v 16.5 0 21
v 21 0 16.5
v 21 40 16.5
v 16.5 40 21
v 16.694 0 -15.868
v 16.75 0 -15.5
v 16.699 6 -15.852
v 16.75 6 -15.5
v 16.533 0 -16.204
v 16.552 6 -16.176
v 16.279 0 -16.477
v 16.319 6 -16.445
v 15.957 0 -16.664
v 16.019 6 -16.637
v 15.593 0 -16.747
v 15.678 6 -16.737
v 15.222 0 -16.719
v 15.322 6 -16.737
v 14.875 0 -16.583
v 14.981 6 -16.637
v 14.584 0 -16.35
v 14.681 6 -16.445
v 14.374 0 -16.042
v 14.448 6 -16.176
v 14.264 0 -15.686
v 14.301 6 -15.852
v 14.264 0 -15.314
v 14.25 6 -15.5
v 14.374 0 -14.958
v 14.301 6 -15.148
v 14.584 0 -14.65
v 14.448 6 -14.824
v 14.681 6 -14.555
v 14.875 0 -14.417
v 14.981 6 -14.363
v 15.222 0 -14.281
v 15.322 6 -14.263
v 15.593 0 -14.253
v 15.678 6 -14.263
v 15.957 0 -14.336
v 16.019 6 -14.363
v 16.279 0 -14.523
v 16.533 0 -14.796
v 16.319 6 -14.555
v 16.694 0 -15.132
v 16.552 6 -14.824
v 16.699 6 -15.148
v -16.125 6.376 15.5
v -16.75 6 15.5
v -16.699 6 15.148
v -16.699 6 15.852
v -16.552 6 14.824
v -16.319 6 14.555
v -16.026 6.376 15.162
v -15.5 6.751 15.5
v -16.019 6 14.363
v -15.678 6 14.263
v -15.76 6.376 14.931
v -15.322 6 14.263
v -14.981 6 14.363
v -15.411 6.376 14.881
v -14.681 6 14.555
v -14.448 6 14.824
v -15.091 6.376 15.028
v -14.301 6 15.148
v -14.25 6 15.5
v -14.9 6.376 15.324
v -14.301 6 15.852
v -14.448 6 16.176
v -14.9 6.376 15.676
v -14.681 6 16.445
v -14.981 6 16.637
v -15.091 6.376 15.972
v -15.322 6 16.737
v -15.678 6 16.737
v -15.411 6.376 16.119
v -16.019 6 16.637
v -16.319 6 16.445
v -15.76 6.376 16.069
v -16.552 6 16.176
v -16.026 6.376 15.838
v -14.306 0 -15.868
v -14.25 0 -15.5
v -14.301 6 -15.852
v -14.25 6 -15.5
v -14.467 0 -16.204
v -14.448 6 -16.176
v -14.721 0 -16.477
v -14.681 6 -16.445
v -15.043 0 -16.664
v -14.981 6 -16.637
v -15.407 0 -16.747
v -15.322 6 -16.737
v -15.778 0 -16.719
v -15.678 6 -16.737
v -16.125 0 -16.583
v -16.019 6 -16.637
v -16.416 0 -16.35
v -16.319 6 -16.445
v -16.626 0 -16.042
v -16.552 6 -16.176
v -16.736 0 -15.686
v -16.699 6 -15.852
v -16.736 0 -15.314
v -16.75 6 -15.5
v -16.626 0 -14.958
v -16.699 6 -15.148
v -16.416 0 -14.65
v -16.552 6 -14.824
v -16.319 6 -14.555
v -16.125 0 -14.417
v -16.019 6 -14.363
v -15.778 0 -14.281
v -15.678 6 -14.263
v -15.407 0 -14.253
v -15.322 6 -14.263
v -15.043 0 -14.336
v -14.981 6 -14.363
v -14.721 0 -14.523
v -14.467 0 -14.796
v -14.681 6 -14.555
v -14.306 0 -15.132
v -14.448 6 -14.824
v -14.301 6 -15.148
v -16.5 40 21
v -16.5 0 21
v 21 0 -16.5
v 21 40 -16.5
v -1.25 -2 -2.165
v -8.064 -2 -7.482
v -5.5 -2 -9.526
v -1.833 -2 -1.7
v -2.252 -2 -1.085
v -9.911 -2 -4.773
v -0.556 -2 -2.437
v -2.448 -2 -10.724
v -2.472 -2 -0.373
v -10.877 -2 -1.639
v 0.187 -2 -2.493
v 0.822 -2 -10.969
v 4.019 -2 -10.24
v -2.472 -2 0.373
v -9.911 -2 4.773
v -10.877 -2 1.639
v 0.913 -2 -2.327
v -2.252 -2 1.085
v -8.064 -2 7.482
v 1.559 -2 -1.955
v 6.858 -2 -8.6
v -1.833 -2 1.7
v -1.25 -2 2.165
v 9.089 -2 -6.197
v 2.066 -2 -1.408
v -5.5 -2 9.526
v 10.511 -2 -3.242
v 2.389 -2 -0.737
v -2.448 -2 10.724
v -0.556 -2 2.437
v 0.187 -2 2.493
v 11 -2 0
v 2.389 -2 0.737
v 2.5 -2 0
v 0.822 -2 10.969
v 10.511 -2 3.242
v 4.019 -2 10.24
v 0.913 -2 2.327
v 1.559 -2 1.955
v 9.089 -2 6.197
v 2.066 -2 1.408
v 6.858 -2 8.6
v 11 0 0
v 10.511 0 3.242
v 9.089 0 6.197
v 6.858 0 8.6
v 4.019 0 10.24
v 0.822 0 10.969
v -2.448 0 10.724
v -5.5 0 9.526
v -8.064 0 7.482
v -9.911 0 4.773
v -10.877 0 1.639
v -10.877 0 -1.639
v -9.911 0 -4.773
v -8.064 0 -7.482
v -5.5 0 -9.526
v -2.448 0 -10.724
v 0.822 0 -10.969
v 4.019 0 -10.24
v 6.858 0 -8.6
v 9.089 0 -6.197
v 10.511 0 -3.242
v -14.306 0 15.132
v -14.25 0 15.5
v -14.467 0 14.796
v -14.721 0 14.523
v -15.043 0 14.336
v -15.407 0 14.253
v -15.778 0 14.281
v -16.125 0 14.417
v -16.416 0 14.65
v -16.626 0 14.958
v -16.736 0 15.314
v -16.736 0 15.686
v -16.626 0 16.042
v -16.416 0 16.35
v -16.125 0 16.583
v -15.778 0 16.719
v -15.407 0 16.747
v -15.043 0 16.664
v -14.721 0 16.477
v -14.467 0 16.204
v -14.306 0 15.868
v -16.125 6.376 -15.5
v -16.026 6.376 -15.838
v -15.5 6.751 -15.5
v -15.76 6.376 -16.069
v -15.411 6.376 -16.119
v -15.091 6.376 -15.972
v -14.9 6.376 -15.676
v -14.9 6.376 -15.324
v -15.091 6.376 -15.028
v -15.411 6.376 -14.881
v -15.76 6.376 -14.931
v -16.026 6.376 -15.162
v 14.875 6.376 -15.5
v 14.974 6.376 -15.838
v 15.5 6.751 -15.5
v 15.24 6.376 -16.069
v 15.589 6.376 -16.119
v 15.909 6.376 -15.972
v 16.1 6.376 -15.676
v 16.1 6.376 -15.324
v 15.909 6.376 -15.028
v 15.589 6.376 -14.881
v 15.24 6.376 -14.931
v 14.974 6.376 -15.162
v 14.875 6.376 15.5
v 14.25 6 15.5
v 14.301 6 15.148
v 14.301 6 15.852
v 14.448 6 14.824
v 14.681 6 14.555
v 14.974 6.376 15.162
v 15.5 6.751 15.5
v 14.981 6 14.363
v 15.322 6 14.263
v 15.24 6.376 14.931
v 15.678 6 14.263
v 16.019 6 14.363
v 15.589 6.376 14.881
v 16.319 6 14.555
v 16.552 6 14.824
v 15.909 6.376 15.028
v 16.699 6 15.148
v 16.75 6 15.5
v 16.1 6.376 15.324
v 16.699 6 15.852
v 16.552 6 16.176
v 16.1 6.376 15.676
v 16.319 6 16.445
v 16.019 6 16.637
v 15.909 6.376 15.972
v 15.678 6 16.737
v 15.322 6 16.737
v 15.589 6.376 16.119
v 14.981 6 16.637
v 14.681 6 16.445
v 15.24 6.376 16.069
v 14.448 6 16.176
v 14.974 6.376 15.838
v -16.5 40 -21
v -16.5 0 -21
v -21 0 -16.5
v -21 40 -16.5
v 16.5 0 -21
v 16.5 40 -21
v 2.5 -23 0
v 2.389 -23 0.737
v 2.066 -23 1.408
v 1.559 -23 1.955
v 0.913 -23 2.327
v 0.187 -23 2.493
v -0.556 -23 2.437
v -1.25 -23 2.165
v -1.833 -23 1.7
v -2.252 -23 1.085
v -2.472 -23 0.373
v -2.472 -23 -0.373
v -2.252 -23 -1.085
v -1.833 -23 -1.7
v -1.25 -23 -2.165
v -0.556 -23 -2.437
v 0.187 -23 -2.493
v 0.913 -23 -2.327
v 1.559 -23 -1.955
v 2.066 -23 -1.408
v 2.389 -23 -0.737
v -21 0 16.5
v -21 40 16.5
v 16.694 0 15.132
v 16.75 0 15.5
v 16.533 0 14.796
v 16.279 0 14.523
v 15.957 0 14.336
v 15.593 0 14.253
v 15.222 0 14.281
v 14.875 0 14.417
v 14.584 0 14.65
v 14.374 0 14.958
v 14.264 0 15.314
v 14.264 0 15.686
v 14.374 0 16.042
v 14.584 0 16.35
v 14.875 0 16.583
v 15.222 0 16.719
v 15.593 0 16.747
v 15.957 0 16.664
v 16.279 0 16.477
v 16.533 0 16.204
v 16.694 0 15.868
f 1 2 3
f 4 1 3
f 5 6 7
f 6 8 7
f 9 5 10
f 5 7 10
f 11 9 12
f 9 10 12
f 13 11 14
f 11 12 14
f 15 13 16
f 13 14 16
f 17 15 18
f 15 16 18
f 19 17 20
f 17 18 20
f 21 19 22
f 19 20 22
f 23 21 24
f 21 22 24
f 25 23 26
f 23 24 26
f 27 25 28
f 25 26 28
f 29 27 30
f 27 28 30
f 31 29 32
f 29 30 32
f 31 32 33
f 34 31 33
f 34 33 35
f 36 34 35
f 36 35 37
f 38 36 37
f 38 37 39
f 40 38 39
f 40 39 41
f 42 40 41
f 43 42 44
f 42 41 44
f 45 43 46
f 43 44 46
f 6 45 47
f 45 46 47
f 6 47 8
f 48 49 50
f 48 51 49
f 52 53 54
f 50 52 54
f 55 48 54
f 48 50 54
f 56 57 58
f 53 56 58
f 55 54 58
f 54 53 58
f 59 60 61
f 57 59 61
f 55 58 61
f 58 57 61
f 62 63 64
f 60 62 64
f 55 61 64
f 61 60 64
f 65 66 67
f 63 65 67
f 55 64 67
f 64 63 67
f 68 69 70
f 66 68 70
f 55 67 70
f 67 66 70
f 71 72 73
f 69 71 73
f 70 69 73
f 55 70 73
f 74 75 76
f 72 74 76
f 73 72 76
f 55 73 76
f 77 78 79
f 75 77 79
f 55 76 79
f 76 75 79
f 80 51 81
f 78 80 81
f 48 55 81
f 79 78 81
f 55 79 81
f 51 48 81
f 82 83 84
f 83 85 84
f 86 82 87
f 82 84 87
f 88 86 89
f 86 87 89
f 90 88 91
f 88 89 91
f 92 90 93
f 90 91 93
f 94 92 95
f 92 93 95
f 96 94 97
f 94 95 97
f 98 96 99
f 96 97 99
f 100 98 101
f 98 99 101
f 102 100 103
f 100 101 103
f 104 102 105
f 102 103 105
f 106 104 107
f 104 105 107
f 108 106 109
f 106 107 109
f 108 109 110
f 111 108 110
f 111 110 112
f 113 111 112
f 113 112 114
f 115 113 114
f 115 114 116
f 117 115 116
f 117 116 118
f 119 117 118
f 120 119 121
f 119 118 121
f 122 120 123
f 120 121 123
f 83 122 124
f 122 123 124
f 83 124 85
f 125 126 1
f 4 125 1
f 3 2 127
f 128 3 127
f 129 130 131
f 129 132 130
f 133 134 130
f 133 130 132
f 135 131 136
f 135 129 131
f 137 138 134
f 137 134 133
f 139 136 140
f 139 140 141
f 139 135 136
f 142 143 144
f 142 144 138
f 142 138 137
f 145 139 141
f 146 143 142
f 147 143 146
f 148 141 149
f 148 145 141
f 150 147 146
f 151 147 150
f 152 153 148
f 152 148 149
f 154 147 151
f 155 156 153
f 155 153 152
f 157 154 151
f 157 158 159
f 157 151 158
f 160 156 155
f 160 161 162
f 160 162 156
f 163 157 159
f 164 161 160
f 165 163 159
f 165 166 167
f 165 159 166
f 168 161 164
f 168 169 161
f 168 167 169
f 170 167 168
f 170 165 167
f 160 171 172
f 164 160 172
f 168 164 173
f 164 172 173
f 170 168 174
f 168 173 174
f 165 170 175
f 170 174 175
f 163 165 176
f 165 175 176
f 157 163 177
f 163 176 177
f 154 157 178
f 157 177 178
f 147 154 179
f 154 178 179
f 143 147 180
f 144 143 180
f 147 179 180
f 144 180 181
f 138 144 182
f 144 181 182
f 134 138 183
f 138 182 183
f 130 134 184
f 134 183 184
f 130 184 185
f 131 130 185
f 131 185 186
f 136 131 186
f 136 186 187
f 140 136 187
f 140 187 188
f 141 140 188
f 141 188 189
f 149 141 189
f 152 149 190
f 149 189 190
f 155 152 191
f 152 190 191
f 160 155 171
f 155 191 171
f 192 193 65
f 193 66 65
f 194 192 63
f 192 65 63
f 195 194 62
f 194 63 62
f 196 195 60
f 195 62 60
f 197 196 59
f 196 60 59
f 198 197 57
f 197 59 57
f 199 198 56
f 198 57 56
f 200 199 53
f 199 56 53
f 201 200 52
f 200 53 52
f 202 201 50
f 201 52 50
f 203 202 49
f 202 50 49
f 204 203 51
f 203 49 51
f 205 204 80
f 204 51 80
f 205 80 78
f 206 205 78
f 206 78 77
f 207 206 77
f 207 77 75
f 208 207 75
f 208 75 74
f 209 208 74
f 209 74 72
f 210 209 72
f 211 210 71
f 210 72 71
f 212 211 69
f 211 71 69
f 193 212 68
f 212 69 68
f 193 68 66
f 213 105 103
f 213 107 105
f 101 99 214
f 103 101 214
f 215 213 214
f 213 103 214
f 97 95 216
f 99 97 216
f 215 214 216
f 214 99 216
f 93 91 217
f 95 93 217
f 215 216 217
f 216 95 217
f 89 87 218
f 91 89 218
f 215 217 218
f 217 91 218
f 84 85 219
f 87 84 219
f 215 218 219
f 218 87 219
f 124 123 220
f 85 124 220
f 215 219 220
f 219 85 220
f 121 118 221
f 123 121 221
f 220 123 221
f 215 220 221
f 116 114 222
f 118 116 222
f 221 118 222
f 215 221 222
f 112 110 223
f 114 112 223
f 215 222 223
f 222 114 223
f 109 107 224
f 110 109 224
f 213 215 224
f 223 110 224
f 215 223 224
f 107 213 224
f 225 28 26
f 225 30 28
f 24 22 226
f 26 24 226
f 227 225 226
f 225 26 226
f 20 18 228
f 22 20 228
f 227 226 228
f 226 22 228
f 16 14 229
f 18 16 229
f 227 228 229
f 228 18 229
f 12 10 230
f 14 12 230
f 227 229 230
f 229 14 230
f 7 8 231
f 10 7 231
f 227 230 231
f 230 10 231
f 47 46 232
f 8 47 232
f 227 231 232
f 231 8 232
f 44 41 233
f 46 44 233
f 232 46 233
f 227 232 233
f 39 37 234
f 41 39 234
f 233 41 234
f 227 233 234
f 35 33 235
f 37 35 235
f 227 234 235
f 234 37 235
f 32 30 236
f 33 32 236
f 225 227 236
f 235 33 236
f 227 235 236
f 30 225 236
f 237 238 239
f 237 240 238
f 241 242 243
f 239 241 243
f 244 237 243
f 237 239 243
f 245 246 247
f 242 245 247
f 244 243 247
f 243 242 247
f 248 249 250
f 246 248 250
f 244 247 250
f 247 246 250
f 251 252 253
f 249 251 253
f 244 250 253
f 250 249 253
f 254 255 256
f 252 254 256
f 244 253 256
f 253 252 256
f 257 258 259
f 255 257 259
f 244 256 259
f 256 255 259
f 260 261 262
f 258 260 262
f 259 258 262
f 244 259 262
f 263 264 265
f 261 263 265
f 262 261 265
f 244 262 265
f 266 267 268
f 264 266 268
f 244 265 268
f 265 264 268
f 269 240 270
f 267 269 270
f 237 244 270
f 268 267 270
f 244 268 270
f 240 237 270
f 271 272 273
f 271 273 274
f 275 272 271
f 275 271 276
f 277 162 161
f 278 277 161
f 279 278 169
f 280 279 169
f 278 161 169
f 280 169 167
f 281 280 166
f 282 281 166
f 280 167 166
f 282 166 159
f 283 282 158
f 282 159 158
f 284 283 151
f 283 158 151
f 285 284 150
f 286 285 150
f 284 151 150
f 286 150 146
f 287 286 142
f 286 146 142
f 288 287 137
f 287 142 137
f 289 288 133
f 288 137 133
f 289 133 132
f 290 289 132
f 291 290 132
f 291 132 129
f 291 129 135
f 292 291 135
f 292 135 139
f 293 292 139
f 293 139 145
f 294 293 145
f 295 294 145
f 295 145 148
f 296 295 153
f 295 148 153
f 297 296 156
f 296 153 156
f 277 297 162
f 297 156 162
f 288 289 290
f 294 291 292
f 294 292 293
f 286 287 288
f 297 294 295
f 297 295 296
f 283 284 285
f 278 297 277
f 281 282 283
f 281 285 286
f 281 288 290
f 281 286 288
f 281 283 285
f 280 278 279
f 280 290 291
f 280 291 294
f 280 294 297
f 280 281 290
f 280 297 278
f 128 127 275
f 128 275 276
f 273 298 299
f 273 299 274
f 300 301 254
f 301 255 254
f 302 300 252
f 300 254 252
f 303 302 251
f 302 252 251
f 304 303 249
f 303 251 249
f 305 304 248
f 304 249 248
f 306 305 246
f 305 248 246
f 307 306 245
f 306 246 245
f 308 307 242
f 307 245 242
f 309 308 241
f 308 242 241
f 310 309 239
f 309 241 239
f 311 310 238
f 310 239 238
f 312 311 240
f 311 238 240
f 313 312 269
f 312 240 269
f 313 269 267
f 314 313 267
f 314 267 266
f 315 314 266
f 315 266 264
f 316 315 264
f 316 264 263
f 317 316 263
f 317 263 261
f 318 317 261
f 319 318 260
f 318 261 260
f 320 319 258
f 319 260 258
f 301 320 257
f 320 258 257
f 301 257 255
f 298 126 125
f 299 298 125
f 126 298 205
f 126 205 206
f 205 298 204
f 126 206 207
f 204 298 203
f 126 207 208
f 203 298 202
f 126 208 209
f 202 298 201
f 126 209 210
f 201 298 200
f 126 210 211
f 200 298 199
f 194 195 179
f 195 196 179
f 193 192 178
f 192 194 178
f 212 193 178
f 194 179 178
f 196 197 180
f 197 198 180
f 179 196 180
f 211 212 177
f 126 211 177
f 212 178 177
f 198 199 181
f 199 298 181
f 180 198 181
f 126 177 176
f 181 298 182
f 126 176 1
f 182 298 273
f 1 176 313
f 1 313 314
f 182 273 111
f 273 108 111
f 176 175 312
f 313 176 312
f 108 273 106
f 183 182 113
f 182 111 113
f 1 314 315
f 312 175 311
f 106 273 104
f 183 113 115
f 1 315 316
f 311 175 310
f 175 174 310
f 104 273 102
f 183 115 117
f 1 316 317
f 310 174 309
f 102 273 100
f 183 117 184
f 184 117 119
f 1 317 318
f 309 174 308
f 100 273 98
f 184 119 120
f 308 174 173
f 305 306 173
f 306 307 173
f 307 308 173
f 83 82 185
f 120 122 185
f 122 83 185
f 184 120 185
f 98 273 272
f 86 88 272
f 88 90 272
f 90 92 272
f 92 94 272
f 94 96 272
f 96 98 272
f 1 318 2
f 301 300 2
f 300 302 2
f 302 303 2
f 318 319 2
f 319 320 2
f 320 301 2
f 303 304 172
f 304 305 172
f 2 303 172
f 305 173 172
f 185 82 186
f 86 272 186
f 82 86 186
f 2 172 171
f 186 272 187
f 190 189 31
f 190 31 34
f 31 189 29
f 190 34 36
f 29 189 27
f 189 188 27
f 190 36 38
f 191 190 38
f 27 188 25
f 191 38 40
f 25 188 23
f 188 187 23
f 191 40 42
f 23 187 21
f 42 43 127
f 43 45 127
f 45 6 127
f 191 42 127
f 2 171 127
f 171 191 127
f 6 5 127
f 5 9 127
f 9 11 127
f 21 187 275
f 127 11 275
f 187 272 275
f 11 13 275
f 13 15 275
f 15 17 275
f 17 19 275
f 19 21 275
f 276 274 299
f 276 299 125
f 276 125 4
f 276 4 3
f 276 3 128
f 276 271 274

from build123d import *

# Parameters (mm, degrees)
SKETCH1_W                 = 42
SKETCH1_H                 = 42
BOSS_EXTRUDE1_DEPTH       = 40
SKETCH2_R                 = 11
BOSS_EXTRUDE2_DEPTH       = 2
SKETCH3_R                 = 2.5
BOSS_EXTRUDE3_DEPTH       = 21
CHAMFER1_SIZE             = 4.5
M3X0_5_TAPPED_HOLE2_D     = 2.5
M3X0_5_TAPPED_HOLE2_DEPTH = 6
M3X0_5_TAPPED_HOLE2_TIP   = 0.751075774


with BuildPart() as part:
    # Sketch1 → Boss-Extrude1 (new body)
    with BuildSketch(Plane(origin=(0, 0, 0), x_dir=(1, 0, 0), z_dir=(0, 1, 0))):
        Rectangle(SKETCH1_W, SKETCH1_H)
    extrude(amount=BOSS_EXTRUDE1_DEPTH)

    # Sketch2 → Boss-Extrude2 (add)
    with BuildSketch(Plane.XZ):
        Circle(SKETCH2_R)
    extrude(amount=BOSS_EXTRUDE2_DEPTH)

    # Sketch3 → Boss-Extrude3 (add)
    with BuildSketch(Plane.XZ.offset(2)):
        Circle(SKETCH3_R)
    extrude(amount=BOSS_EXTRUDE3_DEPTH)

    # Chamfer1
    chamfer1_edges = [part.edges().sort_by_distance(p)[0] for p in [
        (-21, 20, 21),
        (-21, 20, -21),
        (21, 20, -21),
        (21, 20, 21),
    ]]
    chamfer(chamfer1_edges, length=CHAMFER1_SIZE)

    # M3x0.5 Tapped Hole2
    with Locations(Plane(origin=(0, 0, 0), x_dir=(-1, 0, 0), z_dir=(0, -1, 0))):
        with Locations((15.5, 15.5), (-15.5, 15.5), (-15.5, -15.5), (15.5, -15.5)):
            Hole(M3X0_5_TAPPED_HOLE2_D / 2, depth=M3X0_5_TAPPED_HOLE2_DEPTH)
            with Locations((0, 0, -(M3X0_5_TAPPED_HOLE2_DEPTH + M3X0_5_TAPPED_HOLE2_TIP / 2))):  # 118° drill point
                Cone(0, M3X0_5_TAPPED_HOLE2_D / 2, M3X0_5_TAPPED_HOLE2_TIP, mode=Mode.SUBTRACT)


solid = part.part
